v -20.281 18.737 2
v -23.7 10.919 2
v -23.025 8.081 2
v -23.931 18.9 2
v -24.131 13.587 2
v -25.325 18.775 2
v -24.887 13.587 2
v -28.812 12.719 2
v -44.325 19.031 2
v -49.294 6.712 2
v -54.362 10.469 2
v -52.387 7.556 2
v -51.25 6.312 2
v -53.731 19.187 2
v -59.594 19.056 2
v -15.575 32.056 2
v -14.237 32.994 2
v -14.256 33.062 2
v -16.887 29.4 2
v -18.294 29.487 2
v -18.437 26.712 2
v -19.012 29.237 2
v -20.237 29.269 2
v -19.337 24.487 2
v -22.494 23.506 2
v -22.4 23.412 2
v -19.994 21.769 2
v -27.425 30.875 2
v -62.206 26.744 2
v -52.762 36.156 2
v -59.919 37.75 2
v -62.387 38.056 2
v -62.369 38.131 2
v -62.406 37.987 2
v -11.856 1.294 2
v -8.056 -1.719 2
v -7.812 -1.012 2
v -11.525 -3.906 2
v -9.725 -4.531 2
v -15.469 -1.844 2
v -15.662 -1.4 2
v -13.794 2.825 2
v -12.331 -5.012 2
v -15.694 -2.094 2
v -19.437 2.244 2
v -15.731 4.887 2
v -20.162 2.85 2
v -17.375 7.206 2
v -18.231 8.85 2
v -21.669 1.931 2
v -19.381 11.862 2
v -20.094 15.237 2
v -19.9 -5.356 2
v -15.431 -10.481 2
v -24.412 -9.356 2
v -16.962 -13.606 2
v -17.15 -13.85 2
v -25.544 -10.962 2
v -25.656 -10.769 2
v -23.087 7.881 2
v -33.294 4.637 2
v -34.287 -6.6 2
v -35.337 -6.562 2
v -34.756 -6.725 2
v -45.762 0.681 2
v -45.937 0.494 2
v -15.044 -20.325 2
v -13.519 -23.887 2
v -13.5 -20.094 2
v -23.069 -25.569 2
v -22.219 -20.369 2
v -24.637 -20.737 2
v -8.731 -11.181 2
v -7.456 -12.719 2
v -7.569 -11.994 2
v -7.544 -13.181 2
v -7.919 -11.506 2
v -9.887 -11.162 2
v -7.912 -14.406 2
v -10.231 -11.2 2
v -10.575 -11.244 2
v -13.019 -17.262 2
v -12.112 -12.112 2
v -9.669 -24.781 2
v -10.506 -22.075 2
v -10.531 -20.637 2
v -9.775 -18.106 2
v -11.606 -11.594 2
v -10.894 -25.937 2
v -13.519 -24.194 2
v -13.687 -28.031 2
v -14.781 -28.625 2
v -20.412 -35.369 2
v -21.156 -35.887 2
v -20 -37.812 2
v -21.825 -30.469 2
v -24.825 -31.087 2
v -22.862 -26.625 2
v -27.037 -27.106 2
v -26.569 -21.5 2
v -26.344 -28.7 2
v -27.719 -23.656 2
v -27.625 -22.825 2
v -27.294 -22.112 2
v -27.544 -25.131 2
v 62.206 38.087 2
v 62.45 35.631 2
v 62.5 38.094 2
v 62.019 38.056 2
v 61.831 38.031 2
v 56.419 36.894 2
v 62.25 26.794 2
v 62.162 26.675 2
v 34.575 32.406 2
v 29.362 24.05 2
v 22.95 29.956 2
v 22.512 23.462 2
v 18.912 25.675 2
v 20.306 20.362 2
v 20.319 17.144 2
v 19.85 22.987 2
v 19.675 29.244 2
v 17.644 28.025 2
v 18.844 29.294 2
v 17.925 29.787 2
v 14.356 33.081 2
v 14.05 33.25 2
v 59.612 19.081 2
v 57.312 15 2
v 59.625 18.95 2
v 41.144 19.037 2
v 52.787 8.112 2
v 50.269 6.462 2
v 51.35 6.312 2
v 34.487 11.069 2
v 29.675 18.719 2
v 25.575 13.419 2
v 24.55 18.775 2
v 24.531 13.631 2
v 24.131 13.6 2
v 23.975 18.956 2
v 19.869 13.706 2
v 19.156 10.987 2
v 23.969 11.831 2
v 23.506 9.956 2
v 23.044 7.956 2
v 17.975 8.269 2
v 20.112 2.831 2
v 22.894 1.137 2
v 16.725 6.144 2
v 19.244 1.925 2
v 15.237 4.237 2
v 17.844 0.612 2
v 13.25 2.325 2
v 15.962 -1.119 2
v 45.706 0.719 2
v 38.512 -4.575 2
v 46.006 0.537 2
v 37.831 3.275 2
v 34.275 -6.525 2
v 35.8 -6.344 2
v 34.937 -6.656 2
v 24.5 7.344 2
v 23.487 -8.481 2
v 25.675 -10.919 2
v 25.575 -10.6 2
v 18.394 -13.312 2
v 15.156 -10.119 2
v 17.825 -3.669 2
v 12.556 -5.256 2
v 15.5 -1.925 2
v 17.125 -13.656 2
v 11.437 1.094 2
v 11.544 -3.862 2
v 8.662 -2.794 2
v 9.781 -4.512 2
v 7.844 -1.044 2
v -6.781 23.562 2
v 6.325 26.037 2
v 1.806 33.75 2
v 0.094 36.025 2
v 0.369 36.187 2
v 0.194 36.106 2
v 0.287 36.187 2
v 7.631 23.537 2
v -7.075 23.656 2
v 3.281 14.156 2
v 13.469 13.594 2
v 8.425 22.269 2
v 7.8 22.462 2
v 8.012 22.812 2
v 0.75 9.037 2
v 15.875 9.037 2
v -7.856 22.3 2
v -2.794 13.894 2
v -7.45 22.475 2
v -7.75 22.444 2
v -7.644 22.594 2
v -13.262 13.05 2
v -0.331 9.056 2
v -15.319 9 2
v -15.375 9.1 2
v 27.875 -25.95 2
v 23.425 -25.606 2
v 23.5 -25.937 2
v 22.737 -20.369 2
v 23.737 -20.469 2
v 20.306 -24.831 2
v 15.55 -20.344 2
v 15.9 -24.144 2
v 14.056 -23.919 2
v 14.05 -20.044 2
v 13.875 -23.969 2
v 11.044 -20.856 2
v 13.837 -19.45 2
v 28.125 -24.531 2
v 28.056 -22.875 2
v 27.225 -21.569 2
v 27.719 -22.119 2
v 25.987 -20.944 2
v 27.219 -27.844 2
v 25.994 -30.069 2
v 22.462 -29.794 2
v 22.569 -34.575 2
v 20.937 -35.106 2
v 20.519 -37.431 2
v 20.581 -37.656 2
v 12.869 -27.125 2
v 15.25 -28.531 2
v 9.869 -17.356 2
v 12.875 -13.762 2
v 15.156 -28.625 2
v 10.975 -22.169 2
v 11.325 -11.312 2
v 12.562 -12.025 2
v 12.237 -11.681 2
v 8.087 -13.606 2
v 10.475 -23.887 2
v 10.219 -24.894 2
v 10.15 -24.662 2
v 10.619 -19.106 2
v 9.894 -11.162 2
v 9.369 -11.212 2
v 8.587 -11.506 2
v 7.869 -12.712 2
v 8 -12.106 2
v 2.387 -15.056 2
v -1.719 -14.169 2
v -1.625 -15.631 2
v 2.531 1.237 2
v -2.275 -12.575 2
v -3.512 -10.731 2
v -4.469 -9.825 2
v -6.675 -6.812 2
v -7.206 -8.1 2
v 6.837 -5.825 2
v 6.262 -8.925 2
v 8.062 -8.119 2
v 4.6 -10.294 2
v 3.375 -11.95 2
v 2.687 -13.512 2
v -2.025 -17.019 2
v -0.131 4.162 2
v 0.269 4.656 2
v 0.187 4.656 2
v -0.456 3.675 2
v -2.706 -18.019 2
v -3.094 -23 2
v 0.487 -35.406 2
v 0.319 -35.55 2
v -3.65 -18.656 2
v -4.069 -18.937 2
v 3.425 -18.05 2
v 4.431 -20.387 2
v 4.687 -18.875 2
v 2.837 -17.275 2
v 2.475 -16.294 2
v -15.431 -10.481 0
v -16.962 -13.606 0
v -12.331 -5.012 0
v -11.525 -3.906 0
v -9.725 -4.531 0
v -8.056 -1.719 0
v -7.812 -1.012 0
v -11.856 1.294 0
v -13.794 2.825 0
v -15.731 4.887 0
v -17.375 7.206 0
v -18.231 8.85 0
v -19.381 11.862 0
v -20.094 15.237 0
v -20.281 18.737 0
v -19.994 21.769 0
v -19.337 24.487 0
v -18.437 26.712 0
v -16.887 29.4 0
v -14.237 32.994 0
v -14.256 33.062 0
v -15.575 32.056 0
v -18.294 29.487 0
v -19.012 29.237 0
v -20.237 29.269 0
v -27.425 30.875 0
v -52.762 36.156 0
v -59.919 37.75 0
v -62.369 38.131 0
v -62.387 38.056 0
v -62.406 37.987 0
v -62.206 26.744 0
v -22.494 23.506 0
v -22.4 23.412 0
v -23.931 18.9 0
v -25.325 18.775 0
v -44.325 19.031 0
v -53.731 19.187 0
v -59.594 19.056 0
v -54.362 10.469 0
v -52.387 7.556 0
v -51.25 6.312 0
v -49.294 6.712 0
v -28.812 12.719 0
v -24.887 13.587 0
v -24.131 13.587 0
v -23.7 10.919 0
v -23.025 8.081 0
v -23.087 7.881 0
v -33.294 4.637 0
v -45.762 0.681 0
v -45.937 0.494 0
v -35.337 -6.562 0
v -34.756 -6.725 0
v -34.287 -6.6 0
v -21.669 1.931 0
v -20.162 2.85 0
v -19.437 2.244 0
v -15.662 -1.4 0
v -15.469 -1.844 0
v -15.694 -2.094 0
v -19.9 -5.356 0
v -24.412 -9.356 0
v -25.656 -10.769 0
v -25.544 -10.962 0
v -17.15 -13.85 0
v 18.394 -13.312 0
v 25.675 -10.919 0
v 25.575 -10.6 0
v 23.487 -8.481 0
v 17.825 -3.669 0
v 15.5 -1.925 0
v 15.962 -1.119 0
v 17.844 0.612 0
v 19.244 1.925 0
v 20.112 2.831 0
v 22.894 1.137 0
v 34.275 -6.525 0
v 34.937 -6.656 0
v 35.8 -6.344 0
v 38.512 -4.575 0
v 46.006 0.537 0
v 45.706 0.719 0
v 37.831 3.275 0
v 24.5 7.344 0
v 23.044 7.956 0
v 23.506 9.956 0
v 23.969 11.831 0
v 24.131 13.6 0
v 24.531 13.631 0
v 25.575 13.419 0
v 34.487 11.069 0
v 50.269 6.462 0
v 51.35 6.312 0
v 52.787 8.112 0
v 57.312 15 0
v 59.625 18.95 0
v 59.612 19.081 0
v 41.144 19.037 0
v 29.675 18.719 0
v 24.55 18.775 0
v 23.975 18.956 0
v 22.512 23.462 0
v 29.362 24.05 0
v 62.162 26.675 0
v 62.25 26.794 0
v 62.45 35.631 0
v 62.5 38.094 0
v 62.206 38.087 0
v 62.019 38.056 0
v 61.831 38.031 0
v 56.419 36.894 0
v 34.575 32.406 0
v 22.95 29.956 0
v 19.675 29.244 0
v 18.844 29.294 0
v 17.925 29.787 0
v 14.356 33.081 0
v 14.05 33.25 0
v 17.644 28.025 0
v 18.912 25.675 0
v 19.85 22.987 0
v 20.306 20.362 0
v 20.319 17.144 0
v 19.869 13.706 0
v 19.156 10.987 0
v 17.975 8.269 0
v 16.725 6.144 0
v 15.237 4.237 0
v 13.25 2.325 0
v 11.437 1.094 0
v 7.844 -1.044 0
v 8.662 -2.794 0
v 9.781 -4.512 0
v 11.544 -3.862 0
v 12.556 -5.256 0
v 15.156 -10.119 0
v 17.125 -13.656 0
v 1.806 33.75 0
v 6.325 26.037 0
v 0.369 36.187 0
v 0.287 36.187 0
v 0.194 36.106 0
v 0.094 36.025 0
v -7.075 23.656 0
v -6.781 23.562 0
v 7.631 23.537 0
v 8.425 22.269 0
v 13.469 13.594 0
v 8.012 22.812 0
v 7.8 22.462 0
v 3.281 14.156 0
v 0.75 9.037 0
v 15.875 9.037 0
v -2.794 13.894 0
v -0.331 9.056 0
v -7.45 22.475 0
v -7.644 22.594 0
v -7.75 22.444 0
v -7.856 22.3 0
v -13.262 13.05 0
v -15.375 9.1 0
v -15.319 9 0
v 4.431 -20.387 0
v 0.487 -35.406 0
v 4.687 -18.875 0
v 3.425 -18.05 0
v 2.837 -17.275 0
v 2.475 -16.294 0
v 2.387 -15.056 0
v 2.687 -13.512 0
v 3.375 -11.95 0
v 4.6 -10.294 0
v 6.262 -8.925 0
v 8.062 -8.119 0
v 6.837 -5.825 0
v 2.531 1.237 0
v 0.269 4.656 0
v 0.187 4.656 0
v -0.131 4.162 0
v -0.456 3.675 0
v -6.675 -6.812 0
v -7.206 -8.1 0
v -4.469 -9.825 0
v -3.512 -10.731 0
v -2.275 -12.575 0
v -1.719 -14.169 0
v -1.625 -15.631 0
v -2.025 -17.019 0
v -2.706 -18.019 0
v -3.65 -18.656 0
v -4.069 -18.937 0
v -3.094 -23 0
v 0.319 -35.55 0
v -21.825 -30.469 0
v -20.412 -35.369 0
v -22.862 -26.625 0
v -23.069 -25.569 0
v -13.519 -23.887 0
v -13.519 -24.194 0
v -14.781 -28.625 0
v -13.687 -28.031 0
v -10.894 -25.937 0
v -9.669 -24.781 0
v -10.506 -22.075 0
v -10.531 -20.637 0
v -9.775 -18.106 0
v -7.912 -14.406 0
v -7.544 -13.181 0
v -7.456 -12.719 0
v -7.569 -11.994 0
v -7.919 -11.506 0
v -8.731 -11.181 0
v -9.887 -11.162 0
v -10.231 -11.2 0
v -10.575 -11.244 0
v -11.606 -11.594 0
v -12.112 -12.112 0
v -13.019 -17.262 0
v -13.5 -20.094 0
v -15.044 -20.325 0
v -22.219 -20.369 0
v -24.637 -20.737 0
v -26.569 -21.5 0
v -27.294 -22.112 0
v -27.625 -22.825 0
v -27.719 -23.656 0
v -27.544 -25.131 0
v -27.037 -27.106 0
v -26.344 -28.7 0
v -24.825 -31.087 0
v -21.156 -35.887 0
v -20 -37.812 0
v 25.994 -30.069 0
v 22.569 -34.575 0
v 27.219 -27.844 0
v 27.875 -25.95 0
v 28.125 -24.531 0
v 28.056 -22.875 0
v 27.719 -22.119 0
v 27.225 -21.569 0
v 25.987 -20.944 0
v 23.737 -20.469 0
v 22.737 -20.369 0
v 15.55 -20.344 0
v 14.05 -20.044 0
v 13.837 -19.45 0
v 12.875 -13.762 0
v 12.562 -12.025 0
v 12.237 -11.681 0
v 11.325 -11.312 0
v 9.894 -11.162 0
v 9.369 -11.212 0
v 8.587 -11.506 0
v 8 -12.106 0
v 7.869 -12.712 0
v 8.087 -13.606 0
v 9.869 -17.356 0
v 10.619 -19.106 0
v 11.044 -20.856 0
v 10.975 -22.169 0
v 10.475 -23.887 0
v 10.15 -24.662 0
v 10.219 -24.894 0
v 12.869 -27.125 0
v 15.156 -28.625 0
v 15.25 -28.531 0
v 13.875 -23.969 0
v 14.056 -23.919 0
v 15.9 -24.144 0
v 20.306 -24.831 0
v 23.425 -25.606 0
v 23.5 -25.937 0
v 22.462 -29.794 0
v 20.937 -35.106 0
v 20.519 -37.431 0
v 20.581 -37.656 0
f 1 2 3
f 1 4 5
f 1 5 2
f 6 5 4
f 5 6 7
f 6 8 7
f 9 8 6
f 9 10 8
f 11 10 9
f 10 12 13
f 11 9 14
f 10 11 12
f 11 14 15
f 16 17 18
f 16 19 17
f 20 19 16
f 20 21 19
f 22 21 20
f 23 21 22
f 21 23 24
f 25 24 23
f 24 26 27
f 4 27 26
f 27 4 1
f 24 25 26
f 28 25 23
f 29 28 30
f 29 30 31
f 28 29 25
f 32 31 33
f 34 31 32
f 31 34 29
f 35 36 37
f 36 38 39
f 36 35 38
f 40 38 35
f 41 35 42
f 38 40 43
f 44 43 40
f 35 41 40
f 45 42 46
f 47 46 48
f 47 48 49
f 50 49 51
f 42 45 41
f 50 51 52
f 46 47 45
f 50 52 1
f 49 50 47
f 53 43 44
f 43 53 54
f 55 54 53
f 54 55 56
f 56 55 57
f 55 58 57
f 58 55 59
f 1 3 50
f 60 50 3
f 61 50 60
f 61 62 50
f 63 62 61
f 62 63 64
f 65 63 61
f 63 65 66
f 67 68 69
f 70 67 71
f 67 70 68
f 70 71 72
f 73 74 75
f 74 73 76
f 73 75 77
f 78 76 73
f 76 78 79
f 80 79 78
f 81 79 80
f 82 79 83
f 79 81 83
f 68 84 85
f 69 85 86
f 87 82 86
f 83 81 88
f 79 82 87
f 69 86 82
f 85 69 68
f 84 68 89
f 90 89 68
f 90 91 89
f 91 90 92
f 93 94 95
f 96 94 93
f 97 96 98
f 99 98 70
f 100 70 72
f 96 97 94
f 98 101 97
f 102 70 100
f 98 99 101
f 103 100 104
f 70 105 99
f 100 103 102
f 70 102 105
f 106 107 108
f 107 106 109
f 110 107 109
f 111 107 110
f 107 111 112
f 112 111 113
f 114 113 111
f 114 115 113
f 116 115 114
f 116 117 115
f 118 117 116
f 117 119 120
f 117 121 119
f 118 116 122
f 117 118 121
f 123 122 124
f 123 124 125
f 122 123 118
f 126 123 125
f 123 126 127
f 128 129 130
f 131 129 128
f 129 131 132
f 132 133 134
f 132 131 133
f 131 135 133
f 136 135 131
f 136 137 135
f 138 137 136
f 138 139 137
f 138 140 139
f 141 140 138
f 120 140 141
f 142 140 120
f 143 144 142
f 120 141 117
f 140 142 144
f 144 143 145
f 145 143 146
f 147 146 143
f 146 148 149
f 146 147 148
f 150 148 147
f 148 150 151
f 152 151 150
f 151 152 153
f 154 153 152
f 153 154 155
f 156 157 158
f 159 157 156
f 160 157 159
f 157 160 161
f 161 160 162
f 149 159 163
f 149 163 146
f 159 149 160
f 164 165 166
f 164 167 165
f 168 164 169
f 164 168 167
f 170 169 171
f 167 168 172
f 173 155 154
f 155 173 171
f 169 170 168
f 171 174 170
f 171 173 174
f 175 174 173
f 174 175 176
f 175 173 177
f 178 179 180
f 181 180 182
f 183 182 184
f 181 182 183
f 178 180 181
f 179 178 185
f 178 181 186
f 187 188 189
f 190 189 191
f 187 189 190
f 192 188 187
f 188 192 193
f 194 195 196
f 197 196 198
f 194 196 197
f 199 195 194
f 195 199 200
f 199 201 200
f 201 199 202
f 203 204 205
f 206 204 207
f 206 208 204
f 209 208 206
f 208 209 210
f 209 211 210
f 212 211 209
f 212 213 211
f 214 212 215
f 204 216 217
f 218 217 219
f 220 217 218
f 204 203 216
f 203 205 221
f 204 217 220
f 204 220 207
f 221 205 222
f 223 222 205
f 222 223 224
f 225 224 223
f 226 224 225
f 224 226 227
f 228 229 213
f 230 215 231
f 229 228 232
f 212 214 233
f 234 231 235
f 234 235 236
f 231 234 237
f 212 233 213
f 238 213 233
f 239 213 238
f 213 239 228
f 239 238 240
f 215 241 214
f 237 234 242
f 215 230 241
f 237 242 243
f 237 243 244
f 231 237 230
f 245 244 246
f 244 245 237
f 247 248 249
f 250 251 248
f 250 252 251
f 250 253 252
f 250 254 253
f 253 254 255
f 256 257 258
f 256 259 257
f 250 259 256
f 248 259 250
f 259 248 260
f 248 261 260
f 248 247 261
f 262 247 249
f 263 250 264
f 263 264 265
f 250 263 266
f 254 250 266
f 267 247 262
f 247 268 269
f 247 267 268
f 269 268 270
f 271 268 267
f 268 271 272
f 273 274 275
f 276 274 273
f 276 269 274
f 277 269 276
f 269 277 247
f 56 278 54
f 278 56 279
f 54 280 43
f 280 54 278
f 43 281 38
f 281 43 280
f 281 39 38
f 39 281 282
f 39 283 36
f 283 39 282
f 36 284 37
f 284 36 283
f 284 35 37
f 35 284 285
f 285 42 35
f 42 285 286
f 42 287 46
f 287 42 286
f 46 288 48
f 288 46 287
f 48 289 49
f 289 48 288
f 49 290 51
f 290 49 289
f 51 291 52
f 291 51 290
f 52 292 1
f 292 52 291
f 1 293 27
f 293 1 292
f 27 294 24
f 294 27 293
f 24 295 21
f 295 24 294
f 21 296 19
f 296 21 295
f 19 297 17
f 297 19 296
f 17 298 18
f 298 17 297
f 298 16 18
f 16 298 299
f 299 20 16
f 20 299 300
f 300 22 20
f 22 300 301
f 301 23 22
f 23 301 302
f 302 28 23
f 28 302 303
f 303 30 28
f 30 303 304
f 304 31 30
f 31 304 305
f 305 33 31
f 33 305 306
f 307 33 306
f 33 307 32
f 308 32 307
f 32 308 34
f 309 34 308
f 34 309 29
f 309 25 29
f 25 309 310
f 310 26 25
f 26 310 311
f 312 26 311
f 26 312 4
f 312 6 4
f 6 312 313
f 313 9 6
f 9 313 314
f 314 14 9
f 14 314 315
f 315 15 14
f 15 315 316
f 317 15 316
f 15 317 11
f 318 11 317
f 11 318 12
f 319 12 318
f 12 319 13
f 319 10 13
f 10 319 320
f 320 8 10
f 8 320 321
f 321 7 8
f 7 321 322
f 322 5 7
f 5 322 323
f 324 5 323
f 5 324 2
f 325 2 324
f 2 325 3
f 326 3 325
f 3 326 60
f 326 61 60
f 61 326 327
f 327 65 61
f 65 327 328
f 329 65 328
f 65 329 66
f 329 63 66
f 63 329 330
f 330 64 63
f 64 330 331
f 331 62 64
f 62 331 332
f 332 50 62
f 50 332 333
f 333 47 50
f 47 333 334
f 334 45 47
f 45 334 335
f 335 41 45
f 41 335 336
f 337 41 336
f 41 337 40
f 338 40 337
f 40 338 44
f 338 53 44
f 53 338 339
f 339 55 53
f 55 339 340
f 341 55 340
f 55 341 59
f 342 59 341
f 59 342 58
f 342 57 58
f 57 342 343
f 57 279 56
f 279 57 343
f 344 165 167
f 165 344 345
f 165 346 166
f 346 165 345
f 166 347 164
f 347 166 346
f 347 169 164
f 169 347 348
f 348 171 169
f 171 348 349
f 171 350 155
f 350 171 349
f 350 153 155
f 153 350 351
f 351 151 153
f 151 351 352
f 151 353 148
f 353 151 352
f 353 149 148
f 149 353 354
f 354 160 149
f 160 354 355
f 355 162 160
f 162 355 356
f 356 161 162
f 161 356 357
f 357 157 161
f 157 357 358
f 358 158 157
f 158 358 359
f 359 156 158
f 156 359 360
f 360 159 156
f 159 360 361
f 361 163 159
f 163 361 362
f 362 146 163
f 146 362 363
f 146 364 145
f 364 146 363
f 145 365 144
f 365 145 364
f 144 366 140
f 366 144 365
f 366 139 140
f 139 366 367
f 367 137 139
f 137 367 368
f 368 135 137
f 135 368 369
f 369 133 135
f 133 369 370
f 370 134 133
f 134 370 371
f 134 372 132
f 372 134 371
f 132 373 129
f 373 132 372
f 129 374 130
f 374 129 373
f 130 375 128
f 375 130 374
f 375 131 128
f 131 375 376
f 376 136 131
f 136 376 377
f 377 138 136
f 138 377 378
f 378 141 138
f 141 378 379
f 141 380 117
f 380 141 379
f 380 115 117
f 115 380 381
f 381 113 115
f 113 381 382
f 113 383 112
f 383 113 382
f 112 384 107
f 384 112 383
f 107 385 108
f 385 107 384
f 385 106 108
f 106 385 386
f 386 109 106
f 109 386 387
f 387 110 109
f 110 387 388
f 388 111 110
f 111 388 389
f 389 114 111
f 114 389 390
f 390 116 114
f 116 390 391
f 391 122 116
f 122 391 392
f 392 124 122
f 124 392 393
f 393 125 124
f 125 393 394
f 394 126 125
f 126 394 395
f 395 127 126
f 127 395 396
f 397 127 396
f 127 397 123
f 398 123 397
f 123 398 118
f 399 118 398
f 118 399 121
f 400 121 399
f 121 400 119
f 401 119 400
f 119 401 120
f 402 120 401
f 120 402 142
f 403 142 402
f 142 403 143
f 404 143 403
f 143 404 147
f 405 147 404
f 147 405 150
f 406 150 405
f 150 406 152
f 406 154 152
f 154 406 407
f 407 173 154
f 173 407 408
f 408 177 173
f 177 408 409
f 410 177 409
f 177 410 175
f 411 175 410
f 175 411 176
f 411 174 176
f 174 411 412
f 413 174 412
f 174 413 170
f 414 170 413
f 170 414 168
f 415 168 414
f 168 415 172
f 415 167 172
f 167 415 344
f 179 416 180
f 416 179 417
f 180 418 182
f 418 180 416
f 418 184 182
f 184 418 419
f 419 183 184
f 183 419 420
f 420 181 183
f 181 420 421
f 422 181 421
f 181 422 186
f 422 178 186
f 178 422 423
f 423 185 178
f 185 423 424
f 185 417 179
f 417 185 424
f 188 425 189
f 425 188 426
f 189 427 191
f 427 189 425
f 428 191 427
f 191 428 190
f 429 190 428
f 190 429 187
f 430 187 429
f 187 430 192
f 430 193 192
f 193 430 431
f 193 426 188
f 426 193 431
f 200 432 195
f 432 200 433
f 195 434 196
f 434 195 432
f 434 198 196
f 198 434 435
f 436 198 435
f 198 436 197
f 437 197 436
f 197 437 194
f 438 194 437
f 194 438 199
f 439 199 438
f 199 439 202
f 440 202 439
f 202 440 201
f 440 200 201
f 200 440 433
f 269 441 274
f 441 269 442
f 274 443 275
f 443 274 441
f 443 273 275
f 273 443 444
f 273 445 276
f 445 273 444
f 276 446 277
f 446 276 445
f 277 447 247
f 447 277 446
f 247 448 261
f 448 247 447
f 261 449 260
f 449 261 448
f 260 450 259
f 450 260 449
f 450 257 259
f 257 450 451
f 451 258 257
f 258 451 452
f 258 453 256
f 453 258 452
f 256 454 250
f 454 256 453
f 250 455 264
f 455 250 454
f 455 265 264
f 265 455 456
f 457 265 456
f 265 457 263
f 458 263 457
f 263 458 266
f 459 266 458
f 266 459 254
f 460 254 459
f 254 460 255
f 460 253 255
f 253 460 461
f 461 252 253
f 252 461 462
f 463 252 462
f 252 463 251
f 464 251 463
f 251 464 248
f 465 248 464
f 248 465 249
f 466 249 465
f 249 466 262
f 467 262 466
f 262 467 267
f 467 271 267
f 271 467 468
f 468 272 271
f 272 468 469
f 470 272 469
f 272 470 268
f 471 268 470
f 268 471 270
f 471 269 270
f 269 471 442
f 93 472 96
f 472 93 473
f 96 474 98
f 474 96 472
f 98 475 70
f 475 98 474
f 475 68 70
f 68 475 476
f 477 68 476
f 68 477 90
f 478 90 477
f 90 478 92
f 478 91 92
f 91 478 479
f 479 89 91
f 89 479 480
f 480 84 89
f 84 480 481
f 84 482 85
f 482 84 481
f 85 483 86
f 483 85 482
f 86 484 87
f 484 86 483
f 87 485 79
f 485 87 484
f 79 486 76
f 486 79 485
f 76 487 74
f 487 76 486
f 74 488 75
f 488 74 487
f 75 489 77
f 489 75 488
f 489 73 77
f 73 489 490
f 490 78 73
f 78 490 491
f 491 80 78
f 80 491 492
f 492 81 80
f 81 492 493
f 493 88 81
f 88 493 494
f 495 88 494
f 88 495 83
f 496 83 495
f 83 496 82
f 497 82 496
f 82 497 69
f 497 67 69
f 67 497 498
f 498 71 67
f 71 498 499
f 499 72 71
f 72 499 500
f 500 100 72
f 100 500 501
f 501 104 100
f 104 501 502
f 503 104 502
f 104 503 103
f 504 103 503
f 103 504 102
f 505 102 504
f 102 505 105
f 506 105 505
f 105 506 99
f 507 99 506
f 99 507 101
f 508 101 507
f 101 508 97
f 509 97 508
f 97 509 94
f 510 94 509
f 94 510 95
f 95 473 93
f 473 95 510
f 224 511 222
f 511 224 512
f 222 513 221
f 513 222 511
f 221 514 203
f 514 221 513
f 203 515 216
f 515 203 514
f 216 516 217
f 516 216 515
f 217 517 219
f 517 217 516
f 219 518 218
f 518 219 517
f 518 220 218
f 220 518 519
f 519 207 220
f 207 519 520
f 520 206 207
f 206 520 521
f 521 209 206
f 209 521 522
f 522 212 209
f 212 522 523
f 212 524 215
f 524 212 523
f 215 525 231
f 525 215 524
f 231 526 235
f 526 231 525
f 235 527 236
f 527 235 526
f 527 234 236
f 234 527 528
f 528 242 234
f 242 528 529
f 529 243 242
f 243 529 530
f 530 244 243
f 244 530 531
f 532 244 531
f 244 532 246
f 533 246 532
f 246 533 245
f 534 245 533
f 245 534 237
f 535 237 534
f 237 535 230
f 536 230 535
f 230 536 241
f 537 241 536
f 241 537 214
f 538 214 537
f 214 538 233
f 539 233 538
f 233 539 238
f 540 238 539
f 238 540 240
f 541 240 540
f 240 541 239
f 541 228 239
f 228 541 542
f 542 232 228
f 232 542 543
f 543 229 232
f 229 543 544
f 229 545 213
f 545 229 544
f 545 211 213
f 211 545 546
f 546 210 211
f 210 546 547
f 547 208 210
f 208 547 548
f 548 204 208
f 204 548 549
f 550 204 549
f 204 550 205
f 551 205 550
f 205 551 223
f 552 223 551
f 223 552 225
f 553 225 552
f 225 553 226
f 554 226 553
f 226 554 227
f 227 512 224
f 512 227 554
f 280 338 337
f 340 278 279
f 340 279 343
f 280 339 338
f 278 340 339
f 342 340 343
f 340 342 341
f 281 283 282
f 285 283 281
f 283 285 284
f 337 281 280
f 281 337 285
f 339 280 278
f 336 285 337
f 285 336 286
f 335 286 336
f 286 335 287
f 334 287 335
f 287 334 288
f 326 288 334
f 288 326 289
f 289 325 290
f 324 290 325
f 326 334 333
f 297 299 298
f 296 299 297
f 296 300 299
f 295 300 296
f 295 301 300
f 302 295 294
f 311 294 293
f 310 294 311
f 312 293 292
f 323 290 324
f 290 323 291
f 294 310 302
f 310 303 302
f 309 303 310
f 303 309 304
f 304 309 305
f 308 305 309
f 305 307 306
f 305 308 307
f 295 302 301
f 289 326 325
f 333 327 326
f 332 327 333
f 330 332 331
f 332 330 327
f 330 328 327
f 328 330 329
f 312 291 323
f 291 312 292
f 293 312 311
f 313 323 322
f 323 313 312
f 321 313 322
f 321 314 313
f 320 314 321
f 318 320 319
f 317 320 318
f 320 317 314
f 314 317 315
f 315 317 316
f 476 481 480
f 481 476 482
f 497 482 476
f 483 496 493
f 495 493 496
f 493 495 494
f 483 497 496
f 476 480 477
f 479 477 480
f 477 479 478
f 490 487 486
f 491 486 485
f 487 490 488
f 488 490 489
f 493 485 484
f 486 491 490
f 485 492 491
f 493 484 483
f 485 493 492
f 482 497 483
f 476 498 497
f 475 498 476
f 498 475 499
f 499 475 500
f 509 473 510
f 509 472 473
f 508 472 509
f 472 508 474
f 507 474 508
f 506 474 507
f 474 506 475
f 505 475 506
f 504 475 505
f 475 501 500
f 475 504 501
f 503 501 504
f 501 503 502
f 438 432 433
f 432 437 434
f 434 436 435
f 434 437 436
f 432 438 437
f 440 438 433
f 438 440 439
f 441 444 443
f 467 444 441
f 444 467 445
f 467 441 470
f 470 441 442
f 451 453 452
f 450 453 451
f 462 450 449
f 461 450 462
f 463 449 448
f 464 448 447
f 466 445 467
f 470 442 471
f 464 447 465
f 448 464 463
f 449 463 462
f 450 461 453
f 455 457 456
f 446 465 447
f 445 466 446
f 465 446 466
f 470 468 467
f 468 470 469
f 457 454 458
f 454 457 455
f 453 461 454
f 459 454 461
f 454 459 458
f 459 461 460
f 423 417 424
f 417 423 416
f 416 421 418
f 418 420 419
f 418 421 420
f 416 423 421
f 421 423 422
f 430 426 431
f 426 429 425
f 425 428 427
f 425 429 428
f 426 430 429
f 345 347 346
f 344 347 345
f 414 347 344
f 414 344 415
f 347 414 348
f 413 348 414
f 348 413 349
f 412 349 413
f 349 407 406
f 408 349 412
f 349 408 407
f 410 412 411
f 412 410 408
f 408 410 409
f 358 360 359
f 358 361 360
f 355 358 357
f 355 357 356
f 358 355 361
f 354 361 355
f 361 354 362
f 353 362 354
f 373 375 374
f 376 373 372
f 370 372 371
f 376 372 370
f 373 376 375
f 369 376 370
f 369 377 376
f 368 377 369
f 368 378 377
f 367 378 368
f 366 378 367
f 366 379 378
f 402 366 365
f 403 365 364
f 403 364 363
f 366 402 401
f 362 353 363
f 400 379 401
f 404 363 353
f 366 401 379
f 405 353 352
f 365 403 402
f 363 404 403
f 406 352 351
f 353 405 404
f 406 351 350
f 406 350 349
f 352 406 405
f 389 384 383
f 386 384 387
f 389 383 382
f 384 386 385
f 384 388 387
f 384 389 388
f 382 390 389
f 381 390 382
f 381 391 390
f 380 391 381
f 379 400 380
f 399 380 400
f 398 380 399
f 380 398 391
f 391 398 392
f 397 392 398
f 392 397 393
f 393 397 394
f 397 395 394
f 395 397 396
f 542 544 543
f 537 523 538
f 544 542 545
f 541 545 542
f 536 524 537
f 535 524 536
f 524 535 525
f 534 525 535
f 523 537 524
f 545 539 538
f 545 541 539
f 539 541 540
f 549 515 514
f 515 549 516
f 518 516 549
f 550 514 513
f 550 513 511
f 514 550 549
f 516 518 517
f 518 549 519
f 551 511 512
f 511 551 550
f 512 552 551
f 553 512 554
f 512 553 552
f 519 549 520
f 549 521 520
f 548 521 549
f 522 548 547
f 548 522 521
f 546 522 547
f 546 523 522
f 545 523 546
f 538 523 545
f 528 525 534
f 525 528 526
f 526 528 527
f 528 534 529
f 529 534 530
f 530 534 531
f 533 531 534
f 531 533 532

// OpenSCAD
module 7c16ba719b20e1cc6f1dd7272d1ca47c_1()
{
 /* Generated by trace2scad version 20150415
    http://aggregate.org/MAKE/TRACE2SCAD/
    Optimized model has 279/3846 original points
 */
 color([0.48, 0.48, 0.48])
 assign(minx=0) /* polygon minx=15 */
 assign(miny=0) /* polygon miny=75 */
 assign(maxx=20000) /* polygon maxx=20000 */
 assign(maxy=12250) /* polygon maxy=12226 */
 assign(dx=maxx-minx)
 assign(dy=maxy-miny)
 assign(maxd=((dx>dy)?dx:dy))
 scale([1/maxd, 1/maxd, 1])
 translate([-minx-dx/2, -miny-dy/2, 0])
 linear_extrude(height=1, convexity=279)
 union() {
  union() {
   polygon([[18,12214],[15,12203],[47,10404],[6401,9886],[6416,9871],[6171,9149],[5948,9129],[2908,9170],[1403,9195],[465,9174],[1302,7800],[1618,7334],[1800,7135],[2113,7199],[5390,8160],[6018,8299],[6139,8299],[6208,7872],[6316,7418],[6306,7386],[4673,6867],[2678,6234],[2650,6204],[4346,5075],[4439,5049],[4514,5069],[6533,6434],[6774,6581],[6890,6484],[7494,5901],[7525,5830],[7489,5790],[6816,5268],[6094,4628],[5895,4402],[5913,4371],[7256,3909],[7286,3948],[7531,4448],[8027,5323],[8156,5500],[8444,5400],[8711,5850],[8750,5963],[8103,6332],[7793,6577],[7483,6907],[7220,7278],[7083,7541],[6899,8023],[6785,8563],[6755,9123],[6801,9608],[6906,10043],[7050,10399],[7298,10829],[7722,11404],[7719,11415],[7508,11254],[7073,10843],[6958,10803],[6762,10808],[5612,11065],[1558,11910],[413,12165],[21,12226]], convexity=24);
   polygon([[19923,12214],[19893,12210],[19027,12028],[15532,11310],[13672,10918],[13148,10804],[13015,10812],[12868,10891],[12297,11418],[12248,11445],[12823,10609],[13026,10233],[13176,9803],[13249,9383],[13251,8868],[13179,8318],[13065,7883],[12876,7448],[12676,7108],[12438,6803],[12120,6497],[11830,6300],[11255,5958],[11386,5678],[11565,5403],[11847,5507],[12009,5284],[12425,4506],[12740,3940],[12943,3995],[14108,4378],[14092,4429],[13758,4768],[12852,5538],[12480,5817],[12554,5946],[12855,6223],[13079,6433],[13218,6578],[13663,6307],[15484,5081],[15590,5060],[15728,5110],[16162,5393],[17361,6211],[17313,6240],[16053,6649],[13920,7300],[13687,7398],[13761,7718],[13835,8018],[13861,8301],[13925,8306],[14092,8272],[15518,7896],[18043,7159],[18216,7135],[18446,7423],[19170,8525],[19540,9157],[19538,9178],[16583,9171],[14748,9120],[13928,9129],[13836,9158],[13602,9879],[14698,9973],[19946,10393],[19960,10412],[19992,11826],[20000,12220],[19953,12219]], convexity=23);
   polygon([[10031,11902],[10015,11889],[8868,9910],[8915,9895],[11221,9891],[11012,10291],[10289,11525],[10059,11915],[10046,11915]], convexity=5);
   polygon([[11265,9747],[11248,9719],[10525,8390],[10120,7571],[12540,7571],[12155,8300],[11348,9688],[11282,9775]], convexity=5);
   polygon([[8760,9716],[8743,9693],[7878,8213],[7540,7581],[7549,7565],[9947,7574],[9553,8348],[8808,9721],[8777,9740]], convexity=6);
   polygon([[9979,6791],[9927,6713],[8932,5035],[8847,4829],[9285,4553],[9438,4408],[9636,4113],[9725,3858],[9740,3624],[9676,3402],[9567,3242],[9416,3140],[9349,3095],[9505,2445],[10051,437],[10078,460],[10709,2863],[10750,3105],[10548,3237],[10454,3361],[10396,3518],[10382,3716],[10430,3963],[10540,4213],[10736,4478],[11002,4697],[11290,4826],[11094,5193],[10405,6323],[10043,6870],[10030,6870]], convexity=10);
   polygon([[8363,4333],[8308,4326],[8143,4270],[8062,4187],[7917,3363],[7840,2910],[7593,2873],[6445,2866],[6058,2807],[5749,2685],[5633,2587],[5580,2473],[5565,2340],[5593,2104],[5674,1788],[5785,1533],[6028,1151],[6615,383],[6800,75],[6734,466],[6508,1250],[6342,1865],[6309,2034],[7837,2303],[7837,2254],[7635,1545],[7810,1640],[8257,1975],[8453,2160],[8319,2593],[8315,2823],[8436,3228],[8734,3820],[8793,4016],[8807,4090],[8789,4206],[8733,4284],[8603,4336],[8418,4339]], convexity=12);
   polygon([[11541,4335],[11499,4331],[11374,4284],[11280,4188],[11259,4091],[11294,3948],[11579,3348],[11699,3068],[11767,2788],[11756,2578],[11676,2303],[11624,2179],[11635,2142],[12059,1785],[12425,1545],[12440,1560],[12220,2290],[12249,2298],[12544,2262],[13249,2152],[13748,2028],[13760,1975],[13594,1358],[13350,508],[13283,136],[13293,100],[13611,593],[14159,1314],[14355,1670],[14460,1973],[14500,2200],[14489,2465],[14435,2586],[14356,2674],[14158,2774],[13798,2850],[13638,2866],[12488,2870],[12248,2918],[12214,3013],[12060,3923],[12010,4201],[11958,4256],[11812,4315],[11583,4339]], convexity=14);
  }
 }
}

module 7c16ba719b20e1cc6f1dd7272d1ca47c()
{
 /* all layers combined, scaled to within a 1mm cube */
 scale([1, 1, 1/1])
 difference() {
  union() {
   scale([1,1,2]) translate([0,0,-0.5]) 7c16ba719b20e1cc6f1dd7272d1ca47c_1();
  }
  translate([0,0,-2]) cube([2,2,4],center=true);
 }
}

scale([125, 125, 2]) {
	7c16ba719b20e1cc6f1dd7272d1ca47c();
}
